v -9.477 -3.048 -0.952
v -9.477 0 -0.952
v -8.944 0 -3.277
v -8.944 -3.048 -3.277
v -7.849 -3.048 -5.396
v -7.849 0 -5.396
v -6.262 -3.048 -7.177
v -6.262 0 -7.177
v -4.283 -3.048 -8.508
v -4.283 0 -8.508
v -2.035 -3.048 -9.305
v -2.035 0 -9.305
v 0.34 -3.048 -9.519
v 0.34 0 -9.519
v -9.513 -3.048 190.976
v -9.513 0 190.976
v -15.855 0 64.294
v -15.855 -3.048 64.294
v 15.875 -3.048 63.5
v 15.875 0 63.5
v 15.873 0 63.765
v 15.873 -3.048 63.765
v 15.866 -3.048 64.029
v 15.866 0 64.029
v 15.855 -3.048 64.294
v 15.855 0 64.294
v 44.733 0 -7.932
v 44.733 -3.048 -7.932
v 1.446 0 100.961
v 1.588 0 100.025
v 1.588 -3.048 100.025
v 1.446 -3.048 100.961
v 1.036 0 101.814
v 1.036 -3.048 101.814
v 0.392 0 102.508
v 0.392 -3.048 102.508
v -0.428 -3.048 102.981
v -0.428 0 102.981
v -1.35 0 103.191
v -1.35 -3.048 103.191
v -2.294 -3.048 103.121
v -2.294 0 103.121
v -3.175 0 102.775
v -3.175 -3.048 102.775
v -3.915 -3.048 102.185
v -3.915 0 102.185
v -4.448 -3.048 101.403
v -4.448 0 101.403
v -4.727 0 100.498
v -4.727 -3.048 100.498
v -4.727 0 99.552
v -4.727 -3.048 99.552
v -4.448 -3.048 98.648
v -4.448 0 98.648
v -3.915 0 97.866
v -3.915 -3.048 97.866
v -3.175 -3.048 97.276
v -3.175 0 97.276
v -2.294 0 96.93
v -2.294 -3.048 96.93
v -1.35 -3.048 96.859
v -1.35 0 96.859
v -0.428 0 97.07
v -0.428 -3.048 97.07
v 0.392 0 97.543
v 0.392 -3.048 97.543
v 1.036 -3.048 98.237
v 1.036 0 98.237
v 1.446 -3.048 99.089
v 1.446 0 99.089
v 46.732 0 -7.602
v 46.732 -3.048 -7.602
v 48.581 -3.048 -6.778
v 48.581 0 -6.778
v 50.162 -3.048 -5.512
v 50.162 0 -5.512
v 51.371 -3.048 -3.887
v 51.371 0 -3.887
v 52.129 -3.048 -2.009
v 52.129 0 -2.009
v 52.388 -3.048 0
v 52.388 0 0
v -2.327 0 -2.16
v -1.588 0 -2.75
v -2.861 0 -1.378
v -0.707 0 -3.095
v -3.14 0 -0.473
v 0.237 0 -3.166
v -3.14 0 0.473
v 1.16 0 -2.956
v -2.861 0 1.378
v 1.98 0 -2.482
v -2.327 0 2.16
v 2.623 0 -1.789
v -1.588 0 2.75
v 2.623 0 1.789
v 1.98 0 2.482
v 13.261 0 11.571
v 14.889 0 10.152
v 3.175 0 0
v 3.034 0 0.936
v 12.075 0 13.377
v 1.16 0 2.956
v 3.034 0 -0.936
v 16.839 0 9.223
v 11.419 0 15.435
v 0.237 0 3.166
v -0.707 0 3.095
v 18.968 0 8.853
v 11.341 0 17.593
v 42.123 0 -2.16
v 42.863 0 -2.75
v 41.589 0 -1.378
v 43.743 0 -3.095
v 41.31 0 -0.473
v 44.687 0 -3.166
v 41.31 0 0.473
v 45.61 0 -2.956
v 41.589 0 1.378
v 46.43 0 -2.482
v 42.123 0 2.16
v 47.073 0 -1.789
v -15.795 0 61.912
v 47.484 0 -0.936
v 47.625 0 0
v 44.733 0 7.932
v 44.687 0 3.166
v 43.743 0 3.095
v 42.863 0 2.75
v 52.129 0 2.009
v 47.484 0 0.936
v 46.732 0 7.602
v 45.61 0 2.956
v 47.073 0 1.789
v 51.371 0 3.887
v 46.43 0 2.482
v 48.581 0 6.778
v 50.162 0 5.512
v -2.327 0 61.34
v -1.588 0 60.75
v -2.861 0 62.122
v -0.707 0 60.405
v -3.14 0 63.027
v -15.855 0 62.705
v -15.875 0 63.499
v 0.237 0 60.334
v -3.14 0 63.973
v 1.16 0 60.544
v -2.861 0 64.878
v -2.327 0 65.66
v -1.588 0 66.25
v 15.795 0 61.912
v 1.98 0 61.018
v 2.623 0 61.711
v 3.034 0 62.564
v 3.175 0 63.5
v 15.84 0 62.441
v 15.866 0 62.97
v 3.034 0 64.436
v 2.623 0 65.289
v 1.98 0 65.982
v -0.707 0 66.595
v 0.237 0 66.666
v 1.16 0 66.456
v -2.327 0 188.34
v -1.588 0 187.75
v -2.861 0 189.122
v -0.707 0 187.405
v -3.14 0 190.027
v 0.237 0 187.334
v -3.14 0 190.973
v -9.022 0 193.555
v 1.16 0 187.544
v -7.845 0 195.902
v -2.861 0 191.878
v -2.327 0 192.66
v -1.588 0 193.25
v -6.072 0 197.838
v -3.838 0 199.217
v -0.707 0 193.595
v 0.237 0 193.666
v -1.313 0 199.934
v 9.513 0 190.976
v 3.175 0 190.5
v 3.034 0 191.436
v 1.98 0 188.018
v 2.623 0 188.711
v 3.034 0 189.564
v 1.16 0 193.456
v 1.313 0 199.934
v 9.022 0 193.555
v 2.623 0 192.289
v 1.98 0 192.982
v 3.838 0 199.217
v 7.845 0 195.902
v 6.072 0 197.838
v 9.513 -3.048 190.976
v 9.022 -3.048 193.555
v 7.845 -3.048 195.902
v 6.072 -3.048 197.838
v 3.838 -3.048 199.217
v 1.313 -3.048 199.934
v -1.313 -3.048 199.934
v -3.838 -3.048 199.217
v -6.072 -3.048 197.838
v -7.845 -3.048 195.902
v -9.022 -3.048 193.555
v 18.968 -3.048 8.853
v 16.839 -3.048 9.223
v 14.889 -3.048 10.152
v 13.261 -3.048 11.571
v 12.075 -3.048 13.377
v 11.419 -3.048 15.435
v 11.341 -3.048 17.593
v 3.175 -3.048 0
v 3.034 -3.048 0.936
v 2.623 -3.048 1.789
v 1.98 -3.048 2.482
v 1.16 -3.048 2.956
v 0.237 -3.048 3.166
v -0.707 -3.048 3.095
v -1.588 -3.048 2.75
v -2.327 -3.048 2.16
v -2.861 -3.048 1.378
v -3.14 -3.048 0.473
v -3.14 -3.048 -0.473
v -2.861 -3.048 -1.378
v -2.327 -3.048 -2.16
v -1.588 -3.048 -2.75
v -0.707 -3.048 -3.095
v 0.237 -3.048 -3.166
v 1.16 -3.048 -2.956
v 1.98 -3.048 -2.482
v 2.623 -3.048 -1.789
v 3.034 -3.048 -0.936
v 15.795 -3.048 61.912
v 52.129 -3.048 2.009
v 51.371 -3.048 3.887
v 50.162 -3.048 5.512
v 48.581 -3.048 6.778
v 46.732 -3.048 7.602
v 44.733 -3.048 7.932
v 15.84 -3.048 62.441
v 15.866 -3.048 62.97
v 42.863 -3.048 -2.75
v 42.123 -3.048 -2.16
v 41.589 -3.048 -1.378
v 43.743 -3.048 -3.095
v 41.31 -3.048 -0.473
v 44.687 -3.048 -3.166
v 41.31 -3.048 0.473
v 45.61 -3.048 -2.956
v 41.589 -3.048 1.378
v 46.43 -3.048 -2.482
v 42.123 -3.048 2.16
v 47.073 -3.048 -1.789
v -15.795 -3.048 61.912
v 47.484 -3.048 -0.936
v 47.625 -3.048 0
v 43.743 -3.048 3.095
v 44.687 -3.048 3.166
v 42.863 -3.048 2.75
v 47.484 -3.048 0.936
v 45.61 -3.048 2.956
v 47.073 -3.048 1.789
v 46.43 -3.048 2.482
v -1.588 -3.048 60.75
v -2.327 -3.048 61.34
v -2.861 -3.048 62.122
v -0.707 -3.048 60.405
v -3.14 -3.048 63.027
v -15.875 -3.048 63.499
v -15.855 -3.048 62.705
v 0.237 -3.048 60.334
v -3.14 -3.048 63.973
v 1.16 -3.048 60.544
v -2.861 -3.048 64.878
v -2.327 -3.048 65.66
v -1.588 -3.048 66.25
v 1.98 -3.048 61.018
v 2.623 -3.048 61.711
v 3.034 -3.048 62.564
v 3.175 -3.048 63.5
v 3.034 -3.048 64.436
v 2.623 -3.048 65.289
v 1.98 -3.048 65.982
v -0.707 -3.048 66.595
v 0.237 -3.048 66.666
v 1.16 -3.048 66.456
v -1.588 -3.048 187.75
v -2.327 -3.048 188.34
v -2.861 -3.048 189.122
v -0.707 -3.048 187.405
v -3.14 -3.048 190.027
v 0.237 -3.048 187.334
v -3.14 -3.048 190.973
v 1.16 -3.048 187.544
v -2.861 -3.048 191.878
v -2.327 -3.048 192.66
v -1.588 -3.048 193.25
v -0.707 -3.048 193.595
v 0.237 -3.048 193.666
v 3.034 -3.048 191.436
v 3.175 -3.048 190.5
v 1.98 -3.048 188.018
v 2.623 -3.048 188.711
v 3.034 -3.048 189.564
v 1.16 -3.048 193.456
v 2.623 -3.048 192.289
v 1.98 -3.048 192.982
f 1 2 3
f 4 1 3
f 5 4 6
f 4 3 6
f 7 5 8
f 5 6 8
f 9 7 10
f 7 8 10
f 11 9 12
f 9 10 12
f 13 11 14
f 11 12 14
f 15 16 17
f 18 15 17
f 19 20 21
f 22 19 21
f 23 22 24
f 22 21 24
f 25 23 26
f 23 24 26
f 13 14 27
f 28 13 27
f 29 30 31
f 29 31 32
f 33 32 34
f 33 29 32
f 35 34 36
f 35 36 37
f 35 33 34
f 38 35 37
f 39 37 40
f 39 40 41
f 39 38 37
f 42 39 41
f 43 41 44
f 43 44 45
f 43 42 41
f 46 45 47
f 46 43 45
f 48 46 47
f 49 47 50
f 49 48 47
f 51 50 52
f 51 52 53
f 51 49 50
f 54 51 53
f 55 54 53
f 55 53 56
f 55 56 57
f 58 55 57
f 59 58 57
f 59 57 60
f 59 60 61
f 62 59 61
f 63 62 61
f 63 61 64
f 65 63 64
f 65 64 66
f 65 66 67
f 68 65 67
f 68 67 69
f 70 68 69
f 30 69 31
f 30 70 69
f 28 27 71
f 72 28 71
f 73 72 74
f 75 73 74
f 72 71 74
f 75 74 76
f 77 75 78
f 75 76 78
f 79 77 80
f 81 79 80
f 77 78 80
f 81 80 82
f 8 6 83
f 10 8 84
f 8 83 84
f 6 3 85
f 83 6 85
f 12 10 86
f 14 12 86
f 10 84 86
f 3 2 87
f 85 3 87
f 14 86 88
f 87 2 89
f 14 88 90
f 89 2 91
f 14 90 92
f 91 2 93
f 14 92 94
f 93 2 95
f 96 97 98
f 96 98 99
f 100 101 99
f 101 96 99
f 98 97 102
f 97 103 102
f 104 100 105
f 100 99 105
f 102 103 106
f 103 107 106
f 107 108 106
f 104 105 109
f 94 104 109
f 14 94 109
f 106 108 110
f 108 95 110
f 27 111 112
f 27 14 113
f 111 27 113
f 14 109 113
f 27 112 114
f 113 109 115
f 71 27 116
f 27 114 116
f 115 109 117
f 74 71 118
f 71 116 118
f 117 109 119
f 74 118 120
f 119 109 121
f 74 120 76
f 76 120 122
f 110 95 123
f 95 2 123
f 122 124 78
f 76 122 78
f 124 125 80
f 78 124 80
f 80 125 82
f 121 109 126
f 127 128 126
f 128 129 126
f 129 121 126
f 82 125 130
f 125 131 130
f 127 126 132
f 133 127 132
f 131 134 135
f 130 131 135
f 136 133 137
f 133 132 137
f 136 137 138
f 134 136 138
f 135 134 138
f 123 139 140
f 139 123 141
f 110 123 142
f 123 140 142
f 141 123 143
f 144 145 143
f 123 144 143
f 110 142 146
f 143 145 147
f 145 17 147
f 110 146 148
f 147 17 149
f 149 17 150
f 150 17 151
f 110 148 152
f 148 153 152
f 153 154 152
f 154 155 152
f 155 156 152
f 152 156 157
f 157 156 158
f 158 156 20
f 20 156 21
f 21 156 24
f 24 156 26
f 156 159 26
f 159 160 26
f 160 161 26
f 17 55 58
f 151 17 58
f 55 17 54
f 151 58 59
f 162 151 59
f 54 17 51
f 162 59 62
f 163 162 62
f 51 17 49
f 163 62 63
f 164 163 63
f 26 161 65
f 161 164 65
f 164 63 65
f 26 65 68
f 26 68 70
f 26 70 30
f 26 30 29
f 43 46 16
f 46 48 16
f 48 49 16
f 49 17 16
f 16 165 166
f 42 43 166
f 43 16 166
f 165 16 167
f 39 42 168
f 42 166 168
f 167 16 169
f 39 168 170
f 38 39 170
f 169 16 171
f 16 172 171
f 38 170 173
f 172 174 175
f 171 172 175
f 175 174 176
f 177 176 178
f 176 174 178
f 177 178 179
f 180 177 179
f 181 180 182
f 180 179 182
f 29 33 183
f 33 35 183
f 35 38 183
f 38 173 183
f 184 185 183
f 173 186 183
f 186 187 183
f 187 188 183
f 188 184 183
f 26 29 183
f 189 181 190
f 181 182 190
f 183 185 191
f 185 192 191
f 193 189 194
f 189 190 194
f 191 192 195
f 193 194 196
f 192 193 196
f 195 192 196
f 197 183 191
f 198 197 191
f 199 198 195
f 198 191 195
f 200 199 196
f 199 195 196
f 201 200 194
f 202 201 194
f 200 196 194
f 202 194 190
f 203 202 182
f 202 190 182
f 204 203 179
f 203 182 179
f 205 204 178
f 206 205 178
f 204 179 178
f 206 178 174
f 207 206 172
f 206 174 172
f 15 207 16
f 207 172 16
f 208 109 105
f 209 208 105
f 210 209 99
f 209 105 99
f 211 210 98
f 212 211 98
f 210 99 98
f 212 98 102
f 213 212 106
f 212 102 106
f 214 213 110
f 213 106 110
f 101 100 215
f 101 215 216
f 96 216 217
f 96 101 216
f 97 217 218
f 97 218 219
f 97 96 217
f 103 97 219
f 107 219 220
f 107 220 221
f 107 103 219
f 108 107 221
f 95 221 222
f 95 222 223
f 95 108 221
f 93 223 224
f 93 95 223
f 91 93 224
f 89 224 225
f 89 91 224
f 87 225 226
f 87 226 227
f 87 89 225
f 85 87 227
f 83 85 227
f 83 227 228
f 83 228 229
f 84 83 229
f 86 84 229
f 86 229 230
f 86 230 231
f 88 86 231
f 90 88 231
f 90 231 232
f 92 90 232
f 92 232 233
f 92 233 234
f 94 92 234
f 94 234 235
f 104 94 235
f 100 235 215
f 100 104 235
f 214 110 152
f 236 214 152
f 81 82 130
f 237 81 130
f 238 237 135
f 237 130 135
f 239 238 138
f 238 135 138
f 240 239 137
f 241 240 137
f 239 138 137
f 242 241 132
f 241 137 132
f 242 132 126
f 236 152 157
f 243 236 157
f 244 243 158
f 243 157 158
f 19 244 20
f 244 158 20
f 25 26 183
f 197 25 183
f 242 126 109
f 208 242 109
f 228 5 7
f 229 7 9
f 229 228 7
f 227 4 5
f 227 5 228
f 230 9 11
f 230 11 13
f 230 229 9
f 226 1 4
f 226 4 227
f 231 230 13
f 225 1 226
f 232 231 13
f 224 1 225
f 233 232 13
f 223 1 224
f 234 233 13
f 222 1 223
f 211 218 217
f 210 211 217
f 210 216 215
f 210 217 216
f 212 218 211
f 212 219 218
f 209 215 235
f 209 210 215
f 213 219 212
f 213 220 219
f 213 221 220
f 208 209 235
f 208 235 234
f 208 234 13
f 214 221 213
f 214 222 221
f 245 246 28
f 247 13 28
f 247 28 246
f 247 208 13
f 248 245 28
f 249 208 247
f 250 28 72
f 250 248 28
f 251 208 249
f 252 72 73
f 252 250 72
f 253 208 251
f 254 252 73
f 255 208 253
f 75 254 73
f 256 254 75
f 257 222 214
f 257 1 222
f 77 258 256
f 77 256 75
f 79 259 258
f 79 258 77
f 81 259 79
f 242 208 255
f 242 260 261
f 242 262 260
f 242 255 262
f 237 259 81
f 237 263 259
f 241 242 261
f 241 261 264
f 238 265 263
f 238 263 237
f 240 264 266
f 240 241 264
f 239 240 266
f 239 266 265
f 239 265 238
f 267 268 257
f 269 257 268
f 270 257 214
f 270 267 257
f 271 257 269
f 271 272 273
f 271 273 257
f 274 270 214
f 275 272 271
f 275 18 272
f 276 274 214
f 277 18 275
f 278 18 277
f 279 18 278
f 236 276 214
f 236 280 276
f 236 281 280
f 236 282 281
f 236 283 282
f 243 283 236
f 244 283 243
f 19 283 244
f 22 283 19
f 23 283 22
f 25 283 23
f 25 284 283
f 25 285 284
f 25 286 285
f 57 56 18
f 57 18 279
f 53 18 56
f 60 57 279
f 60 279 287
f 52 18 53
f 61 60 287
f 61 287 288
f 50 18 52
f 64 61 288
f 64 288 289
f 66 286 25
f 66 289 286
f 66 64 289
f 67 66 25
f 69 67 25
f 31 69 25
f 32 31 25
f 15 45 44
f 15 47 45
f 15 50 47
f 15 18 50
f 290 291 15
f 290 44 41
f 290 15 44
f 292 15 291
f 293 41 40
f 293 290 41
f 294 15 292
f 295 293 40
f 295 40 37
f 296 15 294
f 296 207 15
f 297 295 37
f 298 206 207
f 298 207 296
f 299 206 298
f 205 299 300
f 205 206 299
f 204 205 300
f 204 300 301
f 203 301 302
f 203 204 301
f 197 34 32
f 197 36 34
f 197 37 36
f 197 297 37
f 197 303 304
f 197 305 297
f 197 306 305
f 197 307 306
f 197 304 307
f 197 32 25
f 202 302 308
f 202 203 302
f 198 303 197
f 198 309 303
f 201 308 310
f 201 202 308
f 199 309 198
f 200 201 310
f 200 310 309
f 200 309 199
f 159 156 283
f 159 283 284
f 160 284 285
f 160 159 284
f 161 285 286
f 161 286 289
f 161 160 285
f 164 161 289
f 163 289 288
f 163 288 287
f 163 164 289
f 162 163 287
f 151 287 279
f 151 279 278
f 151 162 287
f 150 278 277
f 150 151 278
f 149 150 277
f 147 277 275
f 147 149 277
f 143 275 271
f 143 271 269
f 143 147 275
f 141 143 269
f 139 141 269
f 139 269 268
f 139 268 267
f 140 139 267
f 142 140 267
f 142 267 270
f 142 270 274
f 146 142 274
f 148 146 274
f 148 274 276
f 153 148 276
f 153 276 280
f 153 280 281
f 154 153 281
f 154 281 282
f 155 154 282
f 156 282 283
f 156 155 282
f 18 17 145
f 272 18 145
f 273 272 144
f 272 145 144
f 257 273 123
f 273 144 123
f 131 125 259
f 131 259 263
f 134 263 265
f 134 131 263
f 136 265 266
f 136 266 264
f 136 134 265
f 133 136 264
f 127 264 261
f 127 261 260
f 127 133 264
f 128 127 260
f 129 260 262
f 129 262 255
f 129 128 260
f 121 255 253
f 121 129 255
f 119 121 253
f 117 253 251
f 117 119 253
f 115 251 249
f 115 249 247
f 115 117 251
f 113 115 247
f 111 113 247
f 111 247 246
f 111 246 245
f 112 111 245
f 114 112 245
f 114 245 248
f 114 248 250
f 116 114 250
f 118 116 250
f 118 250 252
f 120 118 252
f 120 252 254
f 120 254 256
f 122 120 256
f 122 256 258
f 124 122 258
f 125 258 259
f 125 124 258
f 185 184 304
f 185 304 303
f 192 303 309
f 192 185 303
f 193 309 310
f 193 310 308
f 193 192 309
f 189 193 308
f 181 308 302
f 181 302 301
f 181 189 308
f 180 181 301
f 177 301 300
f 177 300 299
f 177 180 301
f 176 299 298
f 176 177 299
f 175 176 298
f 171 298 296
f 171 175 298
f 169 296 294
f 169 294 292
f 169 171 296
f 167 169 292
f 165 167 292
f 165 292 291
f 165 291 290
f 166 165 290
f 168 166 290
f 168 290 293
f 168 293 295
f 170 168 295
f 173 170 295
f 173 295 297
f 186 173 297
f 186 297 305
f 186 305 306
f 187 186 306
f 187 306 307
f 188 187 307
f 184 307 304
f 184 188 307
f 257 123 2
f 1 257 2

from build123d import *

# Parameters (mm, degrees)
F0_R     = 3.175
F1_DEPTH = 3.048


with BuildPart() as f1:
    # F0 (on Front) → F1 (new body)
    with BuildSketch(Plane.XZ):
        with BuildLine():
            ThreePointArc((0.340179, -9.518923), (6.854408, -6.613827), (9.525, 0))
            ThreePointArc((9.525, 0), (-0.476848, 9.513056), (-9.477255, -0.9525))
            ThreePointArc((-9.477255, -0.9525), (-6.262383, -7.17692), (0.340179, -9.518923))
        make_face()
        Circle(F0_R, mode=Mode.SUBTRACT)
        with BuildLine():
            ThreePointArc((-9.477255, -0.9525), (-0.476848, 9.513056), (9.525, 0))
            ThreePointArc((9.525, 0), (6.854408, -6.613827), (0.340179, -9.518923))
            Line((0.340179, -9.518923), (44.733482, -7.932436))
            ThreePointArc((44.733482, -7.932436), (36.5125, 0), (44.733482, 7.932436))
            Line((44.733482, 7.932436), (18.9676, 8.853234))
            ThreePointArc((18.9676, 8.853234), (13.2612, 11.571359), (11.341187, 17.593382))
            Line((11.341187, 17.593382), (15.795426, 61.9125))
            ThreePointArc((15.795426, 61.9125), (0, 47.625), (-15.795426, 61.9125))
            Line((-15.795426, 61.9125), (-9.477255, -0.9525))
        make_face()
        with BuildLine():
            ThreePointArc((-15.855144, 64.29375), (-15.87001, 63.102003), (-15.795426, 61.9125))
            ThreePointArc((-15.795426, 61.9125), (0, 47.625), (15.795426, 61.9125))
            ThreePointArc((15.795426, 61.9125), (15.855094, 62.705253), (15.875, 63.5))
            ThreePointArc((15.875, 63.5), (15.870035, 63.896999), (15.855144, 64.29375))
            ThreePointArc((15.855144, 64.29375), (0, 79.375), (-15.855144, 64.29375))
        make_face()
        with Locations((0, 63.5)):
            Circle(F0_R, mode=Mode.SUBTRACT)
        with BuildLine():
            ThreePointArc((44.733482, 7.932436), (36.5125, 0), (44.733482, -7.932436))
            ThreePointArc((44.733482, -7.932436), (50.162007, -5.511523), (52.3875, 0))
            ThreePointArc((52.3875, 0), (50.162007, 5.511523), (44.733482, 7.932436))
        make_face()
        with Locations((44.45, 0)):
            Circle(F0_R, mode=Mode.SUBTRACT)
        with BuildLine():
            Line((-9.513086, 190.97625), (-15.855144, 64.29375))
            ThreePointArc((-15.855144, 64.29375), (0, 79.375), (15.855144, 64.29375))
            Line((15.855144, 64.29375), (9.513086, 190.97625))
            ThreePointArc((9.513086, 190.97625), (9.522021, 190.738199), (9.525, 190.5))
            ThreePointArc((9.525, 190.5), (-0.238199, 180.977979), (-9.513086, 190.97625))
        make_face()
        with Locations((-1.5875, 100.0252)):
            Circle(F0_R, mode=Mode.SUBTRACT)
        with BuildLine():
            ThreePointArc((9.513086, 190.97625), (0, 200.025), (-9.513086, 190.97625))
            ThreePointArc((-9.513086, 190.97625), (-0.238199, 180.977979), (9.525, 190.5))
            ThreePointArc((9.525, 190.5), (9.522021, 190.738199), (9.513086, 190.97625))
        make_face()
        with Locations((0, 190.5)):
            Circle(F0_R, mode=Mode.SUBTRACT)
    extrude(amount=F1_DEPTH)


solid = f1.part
